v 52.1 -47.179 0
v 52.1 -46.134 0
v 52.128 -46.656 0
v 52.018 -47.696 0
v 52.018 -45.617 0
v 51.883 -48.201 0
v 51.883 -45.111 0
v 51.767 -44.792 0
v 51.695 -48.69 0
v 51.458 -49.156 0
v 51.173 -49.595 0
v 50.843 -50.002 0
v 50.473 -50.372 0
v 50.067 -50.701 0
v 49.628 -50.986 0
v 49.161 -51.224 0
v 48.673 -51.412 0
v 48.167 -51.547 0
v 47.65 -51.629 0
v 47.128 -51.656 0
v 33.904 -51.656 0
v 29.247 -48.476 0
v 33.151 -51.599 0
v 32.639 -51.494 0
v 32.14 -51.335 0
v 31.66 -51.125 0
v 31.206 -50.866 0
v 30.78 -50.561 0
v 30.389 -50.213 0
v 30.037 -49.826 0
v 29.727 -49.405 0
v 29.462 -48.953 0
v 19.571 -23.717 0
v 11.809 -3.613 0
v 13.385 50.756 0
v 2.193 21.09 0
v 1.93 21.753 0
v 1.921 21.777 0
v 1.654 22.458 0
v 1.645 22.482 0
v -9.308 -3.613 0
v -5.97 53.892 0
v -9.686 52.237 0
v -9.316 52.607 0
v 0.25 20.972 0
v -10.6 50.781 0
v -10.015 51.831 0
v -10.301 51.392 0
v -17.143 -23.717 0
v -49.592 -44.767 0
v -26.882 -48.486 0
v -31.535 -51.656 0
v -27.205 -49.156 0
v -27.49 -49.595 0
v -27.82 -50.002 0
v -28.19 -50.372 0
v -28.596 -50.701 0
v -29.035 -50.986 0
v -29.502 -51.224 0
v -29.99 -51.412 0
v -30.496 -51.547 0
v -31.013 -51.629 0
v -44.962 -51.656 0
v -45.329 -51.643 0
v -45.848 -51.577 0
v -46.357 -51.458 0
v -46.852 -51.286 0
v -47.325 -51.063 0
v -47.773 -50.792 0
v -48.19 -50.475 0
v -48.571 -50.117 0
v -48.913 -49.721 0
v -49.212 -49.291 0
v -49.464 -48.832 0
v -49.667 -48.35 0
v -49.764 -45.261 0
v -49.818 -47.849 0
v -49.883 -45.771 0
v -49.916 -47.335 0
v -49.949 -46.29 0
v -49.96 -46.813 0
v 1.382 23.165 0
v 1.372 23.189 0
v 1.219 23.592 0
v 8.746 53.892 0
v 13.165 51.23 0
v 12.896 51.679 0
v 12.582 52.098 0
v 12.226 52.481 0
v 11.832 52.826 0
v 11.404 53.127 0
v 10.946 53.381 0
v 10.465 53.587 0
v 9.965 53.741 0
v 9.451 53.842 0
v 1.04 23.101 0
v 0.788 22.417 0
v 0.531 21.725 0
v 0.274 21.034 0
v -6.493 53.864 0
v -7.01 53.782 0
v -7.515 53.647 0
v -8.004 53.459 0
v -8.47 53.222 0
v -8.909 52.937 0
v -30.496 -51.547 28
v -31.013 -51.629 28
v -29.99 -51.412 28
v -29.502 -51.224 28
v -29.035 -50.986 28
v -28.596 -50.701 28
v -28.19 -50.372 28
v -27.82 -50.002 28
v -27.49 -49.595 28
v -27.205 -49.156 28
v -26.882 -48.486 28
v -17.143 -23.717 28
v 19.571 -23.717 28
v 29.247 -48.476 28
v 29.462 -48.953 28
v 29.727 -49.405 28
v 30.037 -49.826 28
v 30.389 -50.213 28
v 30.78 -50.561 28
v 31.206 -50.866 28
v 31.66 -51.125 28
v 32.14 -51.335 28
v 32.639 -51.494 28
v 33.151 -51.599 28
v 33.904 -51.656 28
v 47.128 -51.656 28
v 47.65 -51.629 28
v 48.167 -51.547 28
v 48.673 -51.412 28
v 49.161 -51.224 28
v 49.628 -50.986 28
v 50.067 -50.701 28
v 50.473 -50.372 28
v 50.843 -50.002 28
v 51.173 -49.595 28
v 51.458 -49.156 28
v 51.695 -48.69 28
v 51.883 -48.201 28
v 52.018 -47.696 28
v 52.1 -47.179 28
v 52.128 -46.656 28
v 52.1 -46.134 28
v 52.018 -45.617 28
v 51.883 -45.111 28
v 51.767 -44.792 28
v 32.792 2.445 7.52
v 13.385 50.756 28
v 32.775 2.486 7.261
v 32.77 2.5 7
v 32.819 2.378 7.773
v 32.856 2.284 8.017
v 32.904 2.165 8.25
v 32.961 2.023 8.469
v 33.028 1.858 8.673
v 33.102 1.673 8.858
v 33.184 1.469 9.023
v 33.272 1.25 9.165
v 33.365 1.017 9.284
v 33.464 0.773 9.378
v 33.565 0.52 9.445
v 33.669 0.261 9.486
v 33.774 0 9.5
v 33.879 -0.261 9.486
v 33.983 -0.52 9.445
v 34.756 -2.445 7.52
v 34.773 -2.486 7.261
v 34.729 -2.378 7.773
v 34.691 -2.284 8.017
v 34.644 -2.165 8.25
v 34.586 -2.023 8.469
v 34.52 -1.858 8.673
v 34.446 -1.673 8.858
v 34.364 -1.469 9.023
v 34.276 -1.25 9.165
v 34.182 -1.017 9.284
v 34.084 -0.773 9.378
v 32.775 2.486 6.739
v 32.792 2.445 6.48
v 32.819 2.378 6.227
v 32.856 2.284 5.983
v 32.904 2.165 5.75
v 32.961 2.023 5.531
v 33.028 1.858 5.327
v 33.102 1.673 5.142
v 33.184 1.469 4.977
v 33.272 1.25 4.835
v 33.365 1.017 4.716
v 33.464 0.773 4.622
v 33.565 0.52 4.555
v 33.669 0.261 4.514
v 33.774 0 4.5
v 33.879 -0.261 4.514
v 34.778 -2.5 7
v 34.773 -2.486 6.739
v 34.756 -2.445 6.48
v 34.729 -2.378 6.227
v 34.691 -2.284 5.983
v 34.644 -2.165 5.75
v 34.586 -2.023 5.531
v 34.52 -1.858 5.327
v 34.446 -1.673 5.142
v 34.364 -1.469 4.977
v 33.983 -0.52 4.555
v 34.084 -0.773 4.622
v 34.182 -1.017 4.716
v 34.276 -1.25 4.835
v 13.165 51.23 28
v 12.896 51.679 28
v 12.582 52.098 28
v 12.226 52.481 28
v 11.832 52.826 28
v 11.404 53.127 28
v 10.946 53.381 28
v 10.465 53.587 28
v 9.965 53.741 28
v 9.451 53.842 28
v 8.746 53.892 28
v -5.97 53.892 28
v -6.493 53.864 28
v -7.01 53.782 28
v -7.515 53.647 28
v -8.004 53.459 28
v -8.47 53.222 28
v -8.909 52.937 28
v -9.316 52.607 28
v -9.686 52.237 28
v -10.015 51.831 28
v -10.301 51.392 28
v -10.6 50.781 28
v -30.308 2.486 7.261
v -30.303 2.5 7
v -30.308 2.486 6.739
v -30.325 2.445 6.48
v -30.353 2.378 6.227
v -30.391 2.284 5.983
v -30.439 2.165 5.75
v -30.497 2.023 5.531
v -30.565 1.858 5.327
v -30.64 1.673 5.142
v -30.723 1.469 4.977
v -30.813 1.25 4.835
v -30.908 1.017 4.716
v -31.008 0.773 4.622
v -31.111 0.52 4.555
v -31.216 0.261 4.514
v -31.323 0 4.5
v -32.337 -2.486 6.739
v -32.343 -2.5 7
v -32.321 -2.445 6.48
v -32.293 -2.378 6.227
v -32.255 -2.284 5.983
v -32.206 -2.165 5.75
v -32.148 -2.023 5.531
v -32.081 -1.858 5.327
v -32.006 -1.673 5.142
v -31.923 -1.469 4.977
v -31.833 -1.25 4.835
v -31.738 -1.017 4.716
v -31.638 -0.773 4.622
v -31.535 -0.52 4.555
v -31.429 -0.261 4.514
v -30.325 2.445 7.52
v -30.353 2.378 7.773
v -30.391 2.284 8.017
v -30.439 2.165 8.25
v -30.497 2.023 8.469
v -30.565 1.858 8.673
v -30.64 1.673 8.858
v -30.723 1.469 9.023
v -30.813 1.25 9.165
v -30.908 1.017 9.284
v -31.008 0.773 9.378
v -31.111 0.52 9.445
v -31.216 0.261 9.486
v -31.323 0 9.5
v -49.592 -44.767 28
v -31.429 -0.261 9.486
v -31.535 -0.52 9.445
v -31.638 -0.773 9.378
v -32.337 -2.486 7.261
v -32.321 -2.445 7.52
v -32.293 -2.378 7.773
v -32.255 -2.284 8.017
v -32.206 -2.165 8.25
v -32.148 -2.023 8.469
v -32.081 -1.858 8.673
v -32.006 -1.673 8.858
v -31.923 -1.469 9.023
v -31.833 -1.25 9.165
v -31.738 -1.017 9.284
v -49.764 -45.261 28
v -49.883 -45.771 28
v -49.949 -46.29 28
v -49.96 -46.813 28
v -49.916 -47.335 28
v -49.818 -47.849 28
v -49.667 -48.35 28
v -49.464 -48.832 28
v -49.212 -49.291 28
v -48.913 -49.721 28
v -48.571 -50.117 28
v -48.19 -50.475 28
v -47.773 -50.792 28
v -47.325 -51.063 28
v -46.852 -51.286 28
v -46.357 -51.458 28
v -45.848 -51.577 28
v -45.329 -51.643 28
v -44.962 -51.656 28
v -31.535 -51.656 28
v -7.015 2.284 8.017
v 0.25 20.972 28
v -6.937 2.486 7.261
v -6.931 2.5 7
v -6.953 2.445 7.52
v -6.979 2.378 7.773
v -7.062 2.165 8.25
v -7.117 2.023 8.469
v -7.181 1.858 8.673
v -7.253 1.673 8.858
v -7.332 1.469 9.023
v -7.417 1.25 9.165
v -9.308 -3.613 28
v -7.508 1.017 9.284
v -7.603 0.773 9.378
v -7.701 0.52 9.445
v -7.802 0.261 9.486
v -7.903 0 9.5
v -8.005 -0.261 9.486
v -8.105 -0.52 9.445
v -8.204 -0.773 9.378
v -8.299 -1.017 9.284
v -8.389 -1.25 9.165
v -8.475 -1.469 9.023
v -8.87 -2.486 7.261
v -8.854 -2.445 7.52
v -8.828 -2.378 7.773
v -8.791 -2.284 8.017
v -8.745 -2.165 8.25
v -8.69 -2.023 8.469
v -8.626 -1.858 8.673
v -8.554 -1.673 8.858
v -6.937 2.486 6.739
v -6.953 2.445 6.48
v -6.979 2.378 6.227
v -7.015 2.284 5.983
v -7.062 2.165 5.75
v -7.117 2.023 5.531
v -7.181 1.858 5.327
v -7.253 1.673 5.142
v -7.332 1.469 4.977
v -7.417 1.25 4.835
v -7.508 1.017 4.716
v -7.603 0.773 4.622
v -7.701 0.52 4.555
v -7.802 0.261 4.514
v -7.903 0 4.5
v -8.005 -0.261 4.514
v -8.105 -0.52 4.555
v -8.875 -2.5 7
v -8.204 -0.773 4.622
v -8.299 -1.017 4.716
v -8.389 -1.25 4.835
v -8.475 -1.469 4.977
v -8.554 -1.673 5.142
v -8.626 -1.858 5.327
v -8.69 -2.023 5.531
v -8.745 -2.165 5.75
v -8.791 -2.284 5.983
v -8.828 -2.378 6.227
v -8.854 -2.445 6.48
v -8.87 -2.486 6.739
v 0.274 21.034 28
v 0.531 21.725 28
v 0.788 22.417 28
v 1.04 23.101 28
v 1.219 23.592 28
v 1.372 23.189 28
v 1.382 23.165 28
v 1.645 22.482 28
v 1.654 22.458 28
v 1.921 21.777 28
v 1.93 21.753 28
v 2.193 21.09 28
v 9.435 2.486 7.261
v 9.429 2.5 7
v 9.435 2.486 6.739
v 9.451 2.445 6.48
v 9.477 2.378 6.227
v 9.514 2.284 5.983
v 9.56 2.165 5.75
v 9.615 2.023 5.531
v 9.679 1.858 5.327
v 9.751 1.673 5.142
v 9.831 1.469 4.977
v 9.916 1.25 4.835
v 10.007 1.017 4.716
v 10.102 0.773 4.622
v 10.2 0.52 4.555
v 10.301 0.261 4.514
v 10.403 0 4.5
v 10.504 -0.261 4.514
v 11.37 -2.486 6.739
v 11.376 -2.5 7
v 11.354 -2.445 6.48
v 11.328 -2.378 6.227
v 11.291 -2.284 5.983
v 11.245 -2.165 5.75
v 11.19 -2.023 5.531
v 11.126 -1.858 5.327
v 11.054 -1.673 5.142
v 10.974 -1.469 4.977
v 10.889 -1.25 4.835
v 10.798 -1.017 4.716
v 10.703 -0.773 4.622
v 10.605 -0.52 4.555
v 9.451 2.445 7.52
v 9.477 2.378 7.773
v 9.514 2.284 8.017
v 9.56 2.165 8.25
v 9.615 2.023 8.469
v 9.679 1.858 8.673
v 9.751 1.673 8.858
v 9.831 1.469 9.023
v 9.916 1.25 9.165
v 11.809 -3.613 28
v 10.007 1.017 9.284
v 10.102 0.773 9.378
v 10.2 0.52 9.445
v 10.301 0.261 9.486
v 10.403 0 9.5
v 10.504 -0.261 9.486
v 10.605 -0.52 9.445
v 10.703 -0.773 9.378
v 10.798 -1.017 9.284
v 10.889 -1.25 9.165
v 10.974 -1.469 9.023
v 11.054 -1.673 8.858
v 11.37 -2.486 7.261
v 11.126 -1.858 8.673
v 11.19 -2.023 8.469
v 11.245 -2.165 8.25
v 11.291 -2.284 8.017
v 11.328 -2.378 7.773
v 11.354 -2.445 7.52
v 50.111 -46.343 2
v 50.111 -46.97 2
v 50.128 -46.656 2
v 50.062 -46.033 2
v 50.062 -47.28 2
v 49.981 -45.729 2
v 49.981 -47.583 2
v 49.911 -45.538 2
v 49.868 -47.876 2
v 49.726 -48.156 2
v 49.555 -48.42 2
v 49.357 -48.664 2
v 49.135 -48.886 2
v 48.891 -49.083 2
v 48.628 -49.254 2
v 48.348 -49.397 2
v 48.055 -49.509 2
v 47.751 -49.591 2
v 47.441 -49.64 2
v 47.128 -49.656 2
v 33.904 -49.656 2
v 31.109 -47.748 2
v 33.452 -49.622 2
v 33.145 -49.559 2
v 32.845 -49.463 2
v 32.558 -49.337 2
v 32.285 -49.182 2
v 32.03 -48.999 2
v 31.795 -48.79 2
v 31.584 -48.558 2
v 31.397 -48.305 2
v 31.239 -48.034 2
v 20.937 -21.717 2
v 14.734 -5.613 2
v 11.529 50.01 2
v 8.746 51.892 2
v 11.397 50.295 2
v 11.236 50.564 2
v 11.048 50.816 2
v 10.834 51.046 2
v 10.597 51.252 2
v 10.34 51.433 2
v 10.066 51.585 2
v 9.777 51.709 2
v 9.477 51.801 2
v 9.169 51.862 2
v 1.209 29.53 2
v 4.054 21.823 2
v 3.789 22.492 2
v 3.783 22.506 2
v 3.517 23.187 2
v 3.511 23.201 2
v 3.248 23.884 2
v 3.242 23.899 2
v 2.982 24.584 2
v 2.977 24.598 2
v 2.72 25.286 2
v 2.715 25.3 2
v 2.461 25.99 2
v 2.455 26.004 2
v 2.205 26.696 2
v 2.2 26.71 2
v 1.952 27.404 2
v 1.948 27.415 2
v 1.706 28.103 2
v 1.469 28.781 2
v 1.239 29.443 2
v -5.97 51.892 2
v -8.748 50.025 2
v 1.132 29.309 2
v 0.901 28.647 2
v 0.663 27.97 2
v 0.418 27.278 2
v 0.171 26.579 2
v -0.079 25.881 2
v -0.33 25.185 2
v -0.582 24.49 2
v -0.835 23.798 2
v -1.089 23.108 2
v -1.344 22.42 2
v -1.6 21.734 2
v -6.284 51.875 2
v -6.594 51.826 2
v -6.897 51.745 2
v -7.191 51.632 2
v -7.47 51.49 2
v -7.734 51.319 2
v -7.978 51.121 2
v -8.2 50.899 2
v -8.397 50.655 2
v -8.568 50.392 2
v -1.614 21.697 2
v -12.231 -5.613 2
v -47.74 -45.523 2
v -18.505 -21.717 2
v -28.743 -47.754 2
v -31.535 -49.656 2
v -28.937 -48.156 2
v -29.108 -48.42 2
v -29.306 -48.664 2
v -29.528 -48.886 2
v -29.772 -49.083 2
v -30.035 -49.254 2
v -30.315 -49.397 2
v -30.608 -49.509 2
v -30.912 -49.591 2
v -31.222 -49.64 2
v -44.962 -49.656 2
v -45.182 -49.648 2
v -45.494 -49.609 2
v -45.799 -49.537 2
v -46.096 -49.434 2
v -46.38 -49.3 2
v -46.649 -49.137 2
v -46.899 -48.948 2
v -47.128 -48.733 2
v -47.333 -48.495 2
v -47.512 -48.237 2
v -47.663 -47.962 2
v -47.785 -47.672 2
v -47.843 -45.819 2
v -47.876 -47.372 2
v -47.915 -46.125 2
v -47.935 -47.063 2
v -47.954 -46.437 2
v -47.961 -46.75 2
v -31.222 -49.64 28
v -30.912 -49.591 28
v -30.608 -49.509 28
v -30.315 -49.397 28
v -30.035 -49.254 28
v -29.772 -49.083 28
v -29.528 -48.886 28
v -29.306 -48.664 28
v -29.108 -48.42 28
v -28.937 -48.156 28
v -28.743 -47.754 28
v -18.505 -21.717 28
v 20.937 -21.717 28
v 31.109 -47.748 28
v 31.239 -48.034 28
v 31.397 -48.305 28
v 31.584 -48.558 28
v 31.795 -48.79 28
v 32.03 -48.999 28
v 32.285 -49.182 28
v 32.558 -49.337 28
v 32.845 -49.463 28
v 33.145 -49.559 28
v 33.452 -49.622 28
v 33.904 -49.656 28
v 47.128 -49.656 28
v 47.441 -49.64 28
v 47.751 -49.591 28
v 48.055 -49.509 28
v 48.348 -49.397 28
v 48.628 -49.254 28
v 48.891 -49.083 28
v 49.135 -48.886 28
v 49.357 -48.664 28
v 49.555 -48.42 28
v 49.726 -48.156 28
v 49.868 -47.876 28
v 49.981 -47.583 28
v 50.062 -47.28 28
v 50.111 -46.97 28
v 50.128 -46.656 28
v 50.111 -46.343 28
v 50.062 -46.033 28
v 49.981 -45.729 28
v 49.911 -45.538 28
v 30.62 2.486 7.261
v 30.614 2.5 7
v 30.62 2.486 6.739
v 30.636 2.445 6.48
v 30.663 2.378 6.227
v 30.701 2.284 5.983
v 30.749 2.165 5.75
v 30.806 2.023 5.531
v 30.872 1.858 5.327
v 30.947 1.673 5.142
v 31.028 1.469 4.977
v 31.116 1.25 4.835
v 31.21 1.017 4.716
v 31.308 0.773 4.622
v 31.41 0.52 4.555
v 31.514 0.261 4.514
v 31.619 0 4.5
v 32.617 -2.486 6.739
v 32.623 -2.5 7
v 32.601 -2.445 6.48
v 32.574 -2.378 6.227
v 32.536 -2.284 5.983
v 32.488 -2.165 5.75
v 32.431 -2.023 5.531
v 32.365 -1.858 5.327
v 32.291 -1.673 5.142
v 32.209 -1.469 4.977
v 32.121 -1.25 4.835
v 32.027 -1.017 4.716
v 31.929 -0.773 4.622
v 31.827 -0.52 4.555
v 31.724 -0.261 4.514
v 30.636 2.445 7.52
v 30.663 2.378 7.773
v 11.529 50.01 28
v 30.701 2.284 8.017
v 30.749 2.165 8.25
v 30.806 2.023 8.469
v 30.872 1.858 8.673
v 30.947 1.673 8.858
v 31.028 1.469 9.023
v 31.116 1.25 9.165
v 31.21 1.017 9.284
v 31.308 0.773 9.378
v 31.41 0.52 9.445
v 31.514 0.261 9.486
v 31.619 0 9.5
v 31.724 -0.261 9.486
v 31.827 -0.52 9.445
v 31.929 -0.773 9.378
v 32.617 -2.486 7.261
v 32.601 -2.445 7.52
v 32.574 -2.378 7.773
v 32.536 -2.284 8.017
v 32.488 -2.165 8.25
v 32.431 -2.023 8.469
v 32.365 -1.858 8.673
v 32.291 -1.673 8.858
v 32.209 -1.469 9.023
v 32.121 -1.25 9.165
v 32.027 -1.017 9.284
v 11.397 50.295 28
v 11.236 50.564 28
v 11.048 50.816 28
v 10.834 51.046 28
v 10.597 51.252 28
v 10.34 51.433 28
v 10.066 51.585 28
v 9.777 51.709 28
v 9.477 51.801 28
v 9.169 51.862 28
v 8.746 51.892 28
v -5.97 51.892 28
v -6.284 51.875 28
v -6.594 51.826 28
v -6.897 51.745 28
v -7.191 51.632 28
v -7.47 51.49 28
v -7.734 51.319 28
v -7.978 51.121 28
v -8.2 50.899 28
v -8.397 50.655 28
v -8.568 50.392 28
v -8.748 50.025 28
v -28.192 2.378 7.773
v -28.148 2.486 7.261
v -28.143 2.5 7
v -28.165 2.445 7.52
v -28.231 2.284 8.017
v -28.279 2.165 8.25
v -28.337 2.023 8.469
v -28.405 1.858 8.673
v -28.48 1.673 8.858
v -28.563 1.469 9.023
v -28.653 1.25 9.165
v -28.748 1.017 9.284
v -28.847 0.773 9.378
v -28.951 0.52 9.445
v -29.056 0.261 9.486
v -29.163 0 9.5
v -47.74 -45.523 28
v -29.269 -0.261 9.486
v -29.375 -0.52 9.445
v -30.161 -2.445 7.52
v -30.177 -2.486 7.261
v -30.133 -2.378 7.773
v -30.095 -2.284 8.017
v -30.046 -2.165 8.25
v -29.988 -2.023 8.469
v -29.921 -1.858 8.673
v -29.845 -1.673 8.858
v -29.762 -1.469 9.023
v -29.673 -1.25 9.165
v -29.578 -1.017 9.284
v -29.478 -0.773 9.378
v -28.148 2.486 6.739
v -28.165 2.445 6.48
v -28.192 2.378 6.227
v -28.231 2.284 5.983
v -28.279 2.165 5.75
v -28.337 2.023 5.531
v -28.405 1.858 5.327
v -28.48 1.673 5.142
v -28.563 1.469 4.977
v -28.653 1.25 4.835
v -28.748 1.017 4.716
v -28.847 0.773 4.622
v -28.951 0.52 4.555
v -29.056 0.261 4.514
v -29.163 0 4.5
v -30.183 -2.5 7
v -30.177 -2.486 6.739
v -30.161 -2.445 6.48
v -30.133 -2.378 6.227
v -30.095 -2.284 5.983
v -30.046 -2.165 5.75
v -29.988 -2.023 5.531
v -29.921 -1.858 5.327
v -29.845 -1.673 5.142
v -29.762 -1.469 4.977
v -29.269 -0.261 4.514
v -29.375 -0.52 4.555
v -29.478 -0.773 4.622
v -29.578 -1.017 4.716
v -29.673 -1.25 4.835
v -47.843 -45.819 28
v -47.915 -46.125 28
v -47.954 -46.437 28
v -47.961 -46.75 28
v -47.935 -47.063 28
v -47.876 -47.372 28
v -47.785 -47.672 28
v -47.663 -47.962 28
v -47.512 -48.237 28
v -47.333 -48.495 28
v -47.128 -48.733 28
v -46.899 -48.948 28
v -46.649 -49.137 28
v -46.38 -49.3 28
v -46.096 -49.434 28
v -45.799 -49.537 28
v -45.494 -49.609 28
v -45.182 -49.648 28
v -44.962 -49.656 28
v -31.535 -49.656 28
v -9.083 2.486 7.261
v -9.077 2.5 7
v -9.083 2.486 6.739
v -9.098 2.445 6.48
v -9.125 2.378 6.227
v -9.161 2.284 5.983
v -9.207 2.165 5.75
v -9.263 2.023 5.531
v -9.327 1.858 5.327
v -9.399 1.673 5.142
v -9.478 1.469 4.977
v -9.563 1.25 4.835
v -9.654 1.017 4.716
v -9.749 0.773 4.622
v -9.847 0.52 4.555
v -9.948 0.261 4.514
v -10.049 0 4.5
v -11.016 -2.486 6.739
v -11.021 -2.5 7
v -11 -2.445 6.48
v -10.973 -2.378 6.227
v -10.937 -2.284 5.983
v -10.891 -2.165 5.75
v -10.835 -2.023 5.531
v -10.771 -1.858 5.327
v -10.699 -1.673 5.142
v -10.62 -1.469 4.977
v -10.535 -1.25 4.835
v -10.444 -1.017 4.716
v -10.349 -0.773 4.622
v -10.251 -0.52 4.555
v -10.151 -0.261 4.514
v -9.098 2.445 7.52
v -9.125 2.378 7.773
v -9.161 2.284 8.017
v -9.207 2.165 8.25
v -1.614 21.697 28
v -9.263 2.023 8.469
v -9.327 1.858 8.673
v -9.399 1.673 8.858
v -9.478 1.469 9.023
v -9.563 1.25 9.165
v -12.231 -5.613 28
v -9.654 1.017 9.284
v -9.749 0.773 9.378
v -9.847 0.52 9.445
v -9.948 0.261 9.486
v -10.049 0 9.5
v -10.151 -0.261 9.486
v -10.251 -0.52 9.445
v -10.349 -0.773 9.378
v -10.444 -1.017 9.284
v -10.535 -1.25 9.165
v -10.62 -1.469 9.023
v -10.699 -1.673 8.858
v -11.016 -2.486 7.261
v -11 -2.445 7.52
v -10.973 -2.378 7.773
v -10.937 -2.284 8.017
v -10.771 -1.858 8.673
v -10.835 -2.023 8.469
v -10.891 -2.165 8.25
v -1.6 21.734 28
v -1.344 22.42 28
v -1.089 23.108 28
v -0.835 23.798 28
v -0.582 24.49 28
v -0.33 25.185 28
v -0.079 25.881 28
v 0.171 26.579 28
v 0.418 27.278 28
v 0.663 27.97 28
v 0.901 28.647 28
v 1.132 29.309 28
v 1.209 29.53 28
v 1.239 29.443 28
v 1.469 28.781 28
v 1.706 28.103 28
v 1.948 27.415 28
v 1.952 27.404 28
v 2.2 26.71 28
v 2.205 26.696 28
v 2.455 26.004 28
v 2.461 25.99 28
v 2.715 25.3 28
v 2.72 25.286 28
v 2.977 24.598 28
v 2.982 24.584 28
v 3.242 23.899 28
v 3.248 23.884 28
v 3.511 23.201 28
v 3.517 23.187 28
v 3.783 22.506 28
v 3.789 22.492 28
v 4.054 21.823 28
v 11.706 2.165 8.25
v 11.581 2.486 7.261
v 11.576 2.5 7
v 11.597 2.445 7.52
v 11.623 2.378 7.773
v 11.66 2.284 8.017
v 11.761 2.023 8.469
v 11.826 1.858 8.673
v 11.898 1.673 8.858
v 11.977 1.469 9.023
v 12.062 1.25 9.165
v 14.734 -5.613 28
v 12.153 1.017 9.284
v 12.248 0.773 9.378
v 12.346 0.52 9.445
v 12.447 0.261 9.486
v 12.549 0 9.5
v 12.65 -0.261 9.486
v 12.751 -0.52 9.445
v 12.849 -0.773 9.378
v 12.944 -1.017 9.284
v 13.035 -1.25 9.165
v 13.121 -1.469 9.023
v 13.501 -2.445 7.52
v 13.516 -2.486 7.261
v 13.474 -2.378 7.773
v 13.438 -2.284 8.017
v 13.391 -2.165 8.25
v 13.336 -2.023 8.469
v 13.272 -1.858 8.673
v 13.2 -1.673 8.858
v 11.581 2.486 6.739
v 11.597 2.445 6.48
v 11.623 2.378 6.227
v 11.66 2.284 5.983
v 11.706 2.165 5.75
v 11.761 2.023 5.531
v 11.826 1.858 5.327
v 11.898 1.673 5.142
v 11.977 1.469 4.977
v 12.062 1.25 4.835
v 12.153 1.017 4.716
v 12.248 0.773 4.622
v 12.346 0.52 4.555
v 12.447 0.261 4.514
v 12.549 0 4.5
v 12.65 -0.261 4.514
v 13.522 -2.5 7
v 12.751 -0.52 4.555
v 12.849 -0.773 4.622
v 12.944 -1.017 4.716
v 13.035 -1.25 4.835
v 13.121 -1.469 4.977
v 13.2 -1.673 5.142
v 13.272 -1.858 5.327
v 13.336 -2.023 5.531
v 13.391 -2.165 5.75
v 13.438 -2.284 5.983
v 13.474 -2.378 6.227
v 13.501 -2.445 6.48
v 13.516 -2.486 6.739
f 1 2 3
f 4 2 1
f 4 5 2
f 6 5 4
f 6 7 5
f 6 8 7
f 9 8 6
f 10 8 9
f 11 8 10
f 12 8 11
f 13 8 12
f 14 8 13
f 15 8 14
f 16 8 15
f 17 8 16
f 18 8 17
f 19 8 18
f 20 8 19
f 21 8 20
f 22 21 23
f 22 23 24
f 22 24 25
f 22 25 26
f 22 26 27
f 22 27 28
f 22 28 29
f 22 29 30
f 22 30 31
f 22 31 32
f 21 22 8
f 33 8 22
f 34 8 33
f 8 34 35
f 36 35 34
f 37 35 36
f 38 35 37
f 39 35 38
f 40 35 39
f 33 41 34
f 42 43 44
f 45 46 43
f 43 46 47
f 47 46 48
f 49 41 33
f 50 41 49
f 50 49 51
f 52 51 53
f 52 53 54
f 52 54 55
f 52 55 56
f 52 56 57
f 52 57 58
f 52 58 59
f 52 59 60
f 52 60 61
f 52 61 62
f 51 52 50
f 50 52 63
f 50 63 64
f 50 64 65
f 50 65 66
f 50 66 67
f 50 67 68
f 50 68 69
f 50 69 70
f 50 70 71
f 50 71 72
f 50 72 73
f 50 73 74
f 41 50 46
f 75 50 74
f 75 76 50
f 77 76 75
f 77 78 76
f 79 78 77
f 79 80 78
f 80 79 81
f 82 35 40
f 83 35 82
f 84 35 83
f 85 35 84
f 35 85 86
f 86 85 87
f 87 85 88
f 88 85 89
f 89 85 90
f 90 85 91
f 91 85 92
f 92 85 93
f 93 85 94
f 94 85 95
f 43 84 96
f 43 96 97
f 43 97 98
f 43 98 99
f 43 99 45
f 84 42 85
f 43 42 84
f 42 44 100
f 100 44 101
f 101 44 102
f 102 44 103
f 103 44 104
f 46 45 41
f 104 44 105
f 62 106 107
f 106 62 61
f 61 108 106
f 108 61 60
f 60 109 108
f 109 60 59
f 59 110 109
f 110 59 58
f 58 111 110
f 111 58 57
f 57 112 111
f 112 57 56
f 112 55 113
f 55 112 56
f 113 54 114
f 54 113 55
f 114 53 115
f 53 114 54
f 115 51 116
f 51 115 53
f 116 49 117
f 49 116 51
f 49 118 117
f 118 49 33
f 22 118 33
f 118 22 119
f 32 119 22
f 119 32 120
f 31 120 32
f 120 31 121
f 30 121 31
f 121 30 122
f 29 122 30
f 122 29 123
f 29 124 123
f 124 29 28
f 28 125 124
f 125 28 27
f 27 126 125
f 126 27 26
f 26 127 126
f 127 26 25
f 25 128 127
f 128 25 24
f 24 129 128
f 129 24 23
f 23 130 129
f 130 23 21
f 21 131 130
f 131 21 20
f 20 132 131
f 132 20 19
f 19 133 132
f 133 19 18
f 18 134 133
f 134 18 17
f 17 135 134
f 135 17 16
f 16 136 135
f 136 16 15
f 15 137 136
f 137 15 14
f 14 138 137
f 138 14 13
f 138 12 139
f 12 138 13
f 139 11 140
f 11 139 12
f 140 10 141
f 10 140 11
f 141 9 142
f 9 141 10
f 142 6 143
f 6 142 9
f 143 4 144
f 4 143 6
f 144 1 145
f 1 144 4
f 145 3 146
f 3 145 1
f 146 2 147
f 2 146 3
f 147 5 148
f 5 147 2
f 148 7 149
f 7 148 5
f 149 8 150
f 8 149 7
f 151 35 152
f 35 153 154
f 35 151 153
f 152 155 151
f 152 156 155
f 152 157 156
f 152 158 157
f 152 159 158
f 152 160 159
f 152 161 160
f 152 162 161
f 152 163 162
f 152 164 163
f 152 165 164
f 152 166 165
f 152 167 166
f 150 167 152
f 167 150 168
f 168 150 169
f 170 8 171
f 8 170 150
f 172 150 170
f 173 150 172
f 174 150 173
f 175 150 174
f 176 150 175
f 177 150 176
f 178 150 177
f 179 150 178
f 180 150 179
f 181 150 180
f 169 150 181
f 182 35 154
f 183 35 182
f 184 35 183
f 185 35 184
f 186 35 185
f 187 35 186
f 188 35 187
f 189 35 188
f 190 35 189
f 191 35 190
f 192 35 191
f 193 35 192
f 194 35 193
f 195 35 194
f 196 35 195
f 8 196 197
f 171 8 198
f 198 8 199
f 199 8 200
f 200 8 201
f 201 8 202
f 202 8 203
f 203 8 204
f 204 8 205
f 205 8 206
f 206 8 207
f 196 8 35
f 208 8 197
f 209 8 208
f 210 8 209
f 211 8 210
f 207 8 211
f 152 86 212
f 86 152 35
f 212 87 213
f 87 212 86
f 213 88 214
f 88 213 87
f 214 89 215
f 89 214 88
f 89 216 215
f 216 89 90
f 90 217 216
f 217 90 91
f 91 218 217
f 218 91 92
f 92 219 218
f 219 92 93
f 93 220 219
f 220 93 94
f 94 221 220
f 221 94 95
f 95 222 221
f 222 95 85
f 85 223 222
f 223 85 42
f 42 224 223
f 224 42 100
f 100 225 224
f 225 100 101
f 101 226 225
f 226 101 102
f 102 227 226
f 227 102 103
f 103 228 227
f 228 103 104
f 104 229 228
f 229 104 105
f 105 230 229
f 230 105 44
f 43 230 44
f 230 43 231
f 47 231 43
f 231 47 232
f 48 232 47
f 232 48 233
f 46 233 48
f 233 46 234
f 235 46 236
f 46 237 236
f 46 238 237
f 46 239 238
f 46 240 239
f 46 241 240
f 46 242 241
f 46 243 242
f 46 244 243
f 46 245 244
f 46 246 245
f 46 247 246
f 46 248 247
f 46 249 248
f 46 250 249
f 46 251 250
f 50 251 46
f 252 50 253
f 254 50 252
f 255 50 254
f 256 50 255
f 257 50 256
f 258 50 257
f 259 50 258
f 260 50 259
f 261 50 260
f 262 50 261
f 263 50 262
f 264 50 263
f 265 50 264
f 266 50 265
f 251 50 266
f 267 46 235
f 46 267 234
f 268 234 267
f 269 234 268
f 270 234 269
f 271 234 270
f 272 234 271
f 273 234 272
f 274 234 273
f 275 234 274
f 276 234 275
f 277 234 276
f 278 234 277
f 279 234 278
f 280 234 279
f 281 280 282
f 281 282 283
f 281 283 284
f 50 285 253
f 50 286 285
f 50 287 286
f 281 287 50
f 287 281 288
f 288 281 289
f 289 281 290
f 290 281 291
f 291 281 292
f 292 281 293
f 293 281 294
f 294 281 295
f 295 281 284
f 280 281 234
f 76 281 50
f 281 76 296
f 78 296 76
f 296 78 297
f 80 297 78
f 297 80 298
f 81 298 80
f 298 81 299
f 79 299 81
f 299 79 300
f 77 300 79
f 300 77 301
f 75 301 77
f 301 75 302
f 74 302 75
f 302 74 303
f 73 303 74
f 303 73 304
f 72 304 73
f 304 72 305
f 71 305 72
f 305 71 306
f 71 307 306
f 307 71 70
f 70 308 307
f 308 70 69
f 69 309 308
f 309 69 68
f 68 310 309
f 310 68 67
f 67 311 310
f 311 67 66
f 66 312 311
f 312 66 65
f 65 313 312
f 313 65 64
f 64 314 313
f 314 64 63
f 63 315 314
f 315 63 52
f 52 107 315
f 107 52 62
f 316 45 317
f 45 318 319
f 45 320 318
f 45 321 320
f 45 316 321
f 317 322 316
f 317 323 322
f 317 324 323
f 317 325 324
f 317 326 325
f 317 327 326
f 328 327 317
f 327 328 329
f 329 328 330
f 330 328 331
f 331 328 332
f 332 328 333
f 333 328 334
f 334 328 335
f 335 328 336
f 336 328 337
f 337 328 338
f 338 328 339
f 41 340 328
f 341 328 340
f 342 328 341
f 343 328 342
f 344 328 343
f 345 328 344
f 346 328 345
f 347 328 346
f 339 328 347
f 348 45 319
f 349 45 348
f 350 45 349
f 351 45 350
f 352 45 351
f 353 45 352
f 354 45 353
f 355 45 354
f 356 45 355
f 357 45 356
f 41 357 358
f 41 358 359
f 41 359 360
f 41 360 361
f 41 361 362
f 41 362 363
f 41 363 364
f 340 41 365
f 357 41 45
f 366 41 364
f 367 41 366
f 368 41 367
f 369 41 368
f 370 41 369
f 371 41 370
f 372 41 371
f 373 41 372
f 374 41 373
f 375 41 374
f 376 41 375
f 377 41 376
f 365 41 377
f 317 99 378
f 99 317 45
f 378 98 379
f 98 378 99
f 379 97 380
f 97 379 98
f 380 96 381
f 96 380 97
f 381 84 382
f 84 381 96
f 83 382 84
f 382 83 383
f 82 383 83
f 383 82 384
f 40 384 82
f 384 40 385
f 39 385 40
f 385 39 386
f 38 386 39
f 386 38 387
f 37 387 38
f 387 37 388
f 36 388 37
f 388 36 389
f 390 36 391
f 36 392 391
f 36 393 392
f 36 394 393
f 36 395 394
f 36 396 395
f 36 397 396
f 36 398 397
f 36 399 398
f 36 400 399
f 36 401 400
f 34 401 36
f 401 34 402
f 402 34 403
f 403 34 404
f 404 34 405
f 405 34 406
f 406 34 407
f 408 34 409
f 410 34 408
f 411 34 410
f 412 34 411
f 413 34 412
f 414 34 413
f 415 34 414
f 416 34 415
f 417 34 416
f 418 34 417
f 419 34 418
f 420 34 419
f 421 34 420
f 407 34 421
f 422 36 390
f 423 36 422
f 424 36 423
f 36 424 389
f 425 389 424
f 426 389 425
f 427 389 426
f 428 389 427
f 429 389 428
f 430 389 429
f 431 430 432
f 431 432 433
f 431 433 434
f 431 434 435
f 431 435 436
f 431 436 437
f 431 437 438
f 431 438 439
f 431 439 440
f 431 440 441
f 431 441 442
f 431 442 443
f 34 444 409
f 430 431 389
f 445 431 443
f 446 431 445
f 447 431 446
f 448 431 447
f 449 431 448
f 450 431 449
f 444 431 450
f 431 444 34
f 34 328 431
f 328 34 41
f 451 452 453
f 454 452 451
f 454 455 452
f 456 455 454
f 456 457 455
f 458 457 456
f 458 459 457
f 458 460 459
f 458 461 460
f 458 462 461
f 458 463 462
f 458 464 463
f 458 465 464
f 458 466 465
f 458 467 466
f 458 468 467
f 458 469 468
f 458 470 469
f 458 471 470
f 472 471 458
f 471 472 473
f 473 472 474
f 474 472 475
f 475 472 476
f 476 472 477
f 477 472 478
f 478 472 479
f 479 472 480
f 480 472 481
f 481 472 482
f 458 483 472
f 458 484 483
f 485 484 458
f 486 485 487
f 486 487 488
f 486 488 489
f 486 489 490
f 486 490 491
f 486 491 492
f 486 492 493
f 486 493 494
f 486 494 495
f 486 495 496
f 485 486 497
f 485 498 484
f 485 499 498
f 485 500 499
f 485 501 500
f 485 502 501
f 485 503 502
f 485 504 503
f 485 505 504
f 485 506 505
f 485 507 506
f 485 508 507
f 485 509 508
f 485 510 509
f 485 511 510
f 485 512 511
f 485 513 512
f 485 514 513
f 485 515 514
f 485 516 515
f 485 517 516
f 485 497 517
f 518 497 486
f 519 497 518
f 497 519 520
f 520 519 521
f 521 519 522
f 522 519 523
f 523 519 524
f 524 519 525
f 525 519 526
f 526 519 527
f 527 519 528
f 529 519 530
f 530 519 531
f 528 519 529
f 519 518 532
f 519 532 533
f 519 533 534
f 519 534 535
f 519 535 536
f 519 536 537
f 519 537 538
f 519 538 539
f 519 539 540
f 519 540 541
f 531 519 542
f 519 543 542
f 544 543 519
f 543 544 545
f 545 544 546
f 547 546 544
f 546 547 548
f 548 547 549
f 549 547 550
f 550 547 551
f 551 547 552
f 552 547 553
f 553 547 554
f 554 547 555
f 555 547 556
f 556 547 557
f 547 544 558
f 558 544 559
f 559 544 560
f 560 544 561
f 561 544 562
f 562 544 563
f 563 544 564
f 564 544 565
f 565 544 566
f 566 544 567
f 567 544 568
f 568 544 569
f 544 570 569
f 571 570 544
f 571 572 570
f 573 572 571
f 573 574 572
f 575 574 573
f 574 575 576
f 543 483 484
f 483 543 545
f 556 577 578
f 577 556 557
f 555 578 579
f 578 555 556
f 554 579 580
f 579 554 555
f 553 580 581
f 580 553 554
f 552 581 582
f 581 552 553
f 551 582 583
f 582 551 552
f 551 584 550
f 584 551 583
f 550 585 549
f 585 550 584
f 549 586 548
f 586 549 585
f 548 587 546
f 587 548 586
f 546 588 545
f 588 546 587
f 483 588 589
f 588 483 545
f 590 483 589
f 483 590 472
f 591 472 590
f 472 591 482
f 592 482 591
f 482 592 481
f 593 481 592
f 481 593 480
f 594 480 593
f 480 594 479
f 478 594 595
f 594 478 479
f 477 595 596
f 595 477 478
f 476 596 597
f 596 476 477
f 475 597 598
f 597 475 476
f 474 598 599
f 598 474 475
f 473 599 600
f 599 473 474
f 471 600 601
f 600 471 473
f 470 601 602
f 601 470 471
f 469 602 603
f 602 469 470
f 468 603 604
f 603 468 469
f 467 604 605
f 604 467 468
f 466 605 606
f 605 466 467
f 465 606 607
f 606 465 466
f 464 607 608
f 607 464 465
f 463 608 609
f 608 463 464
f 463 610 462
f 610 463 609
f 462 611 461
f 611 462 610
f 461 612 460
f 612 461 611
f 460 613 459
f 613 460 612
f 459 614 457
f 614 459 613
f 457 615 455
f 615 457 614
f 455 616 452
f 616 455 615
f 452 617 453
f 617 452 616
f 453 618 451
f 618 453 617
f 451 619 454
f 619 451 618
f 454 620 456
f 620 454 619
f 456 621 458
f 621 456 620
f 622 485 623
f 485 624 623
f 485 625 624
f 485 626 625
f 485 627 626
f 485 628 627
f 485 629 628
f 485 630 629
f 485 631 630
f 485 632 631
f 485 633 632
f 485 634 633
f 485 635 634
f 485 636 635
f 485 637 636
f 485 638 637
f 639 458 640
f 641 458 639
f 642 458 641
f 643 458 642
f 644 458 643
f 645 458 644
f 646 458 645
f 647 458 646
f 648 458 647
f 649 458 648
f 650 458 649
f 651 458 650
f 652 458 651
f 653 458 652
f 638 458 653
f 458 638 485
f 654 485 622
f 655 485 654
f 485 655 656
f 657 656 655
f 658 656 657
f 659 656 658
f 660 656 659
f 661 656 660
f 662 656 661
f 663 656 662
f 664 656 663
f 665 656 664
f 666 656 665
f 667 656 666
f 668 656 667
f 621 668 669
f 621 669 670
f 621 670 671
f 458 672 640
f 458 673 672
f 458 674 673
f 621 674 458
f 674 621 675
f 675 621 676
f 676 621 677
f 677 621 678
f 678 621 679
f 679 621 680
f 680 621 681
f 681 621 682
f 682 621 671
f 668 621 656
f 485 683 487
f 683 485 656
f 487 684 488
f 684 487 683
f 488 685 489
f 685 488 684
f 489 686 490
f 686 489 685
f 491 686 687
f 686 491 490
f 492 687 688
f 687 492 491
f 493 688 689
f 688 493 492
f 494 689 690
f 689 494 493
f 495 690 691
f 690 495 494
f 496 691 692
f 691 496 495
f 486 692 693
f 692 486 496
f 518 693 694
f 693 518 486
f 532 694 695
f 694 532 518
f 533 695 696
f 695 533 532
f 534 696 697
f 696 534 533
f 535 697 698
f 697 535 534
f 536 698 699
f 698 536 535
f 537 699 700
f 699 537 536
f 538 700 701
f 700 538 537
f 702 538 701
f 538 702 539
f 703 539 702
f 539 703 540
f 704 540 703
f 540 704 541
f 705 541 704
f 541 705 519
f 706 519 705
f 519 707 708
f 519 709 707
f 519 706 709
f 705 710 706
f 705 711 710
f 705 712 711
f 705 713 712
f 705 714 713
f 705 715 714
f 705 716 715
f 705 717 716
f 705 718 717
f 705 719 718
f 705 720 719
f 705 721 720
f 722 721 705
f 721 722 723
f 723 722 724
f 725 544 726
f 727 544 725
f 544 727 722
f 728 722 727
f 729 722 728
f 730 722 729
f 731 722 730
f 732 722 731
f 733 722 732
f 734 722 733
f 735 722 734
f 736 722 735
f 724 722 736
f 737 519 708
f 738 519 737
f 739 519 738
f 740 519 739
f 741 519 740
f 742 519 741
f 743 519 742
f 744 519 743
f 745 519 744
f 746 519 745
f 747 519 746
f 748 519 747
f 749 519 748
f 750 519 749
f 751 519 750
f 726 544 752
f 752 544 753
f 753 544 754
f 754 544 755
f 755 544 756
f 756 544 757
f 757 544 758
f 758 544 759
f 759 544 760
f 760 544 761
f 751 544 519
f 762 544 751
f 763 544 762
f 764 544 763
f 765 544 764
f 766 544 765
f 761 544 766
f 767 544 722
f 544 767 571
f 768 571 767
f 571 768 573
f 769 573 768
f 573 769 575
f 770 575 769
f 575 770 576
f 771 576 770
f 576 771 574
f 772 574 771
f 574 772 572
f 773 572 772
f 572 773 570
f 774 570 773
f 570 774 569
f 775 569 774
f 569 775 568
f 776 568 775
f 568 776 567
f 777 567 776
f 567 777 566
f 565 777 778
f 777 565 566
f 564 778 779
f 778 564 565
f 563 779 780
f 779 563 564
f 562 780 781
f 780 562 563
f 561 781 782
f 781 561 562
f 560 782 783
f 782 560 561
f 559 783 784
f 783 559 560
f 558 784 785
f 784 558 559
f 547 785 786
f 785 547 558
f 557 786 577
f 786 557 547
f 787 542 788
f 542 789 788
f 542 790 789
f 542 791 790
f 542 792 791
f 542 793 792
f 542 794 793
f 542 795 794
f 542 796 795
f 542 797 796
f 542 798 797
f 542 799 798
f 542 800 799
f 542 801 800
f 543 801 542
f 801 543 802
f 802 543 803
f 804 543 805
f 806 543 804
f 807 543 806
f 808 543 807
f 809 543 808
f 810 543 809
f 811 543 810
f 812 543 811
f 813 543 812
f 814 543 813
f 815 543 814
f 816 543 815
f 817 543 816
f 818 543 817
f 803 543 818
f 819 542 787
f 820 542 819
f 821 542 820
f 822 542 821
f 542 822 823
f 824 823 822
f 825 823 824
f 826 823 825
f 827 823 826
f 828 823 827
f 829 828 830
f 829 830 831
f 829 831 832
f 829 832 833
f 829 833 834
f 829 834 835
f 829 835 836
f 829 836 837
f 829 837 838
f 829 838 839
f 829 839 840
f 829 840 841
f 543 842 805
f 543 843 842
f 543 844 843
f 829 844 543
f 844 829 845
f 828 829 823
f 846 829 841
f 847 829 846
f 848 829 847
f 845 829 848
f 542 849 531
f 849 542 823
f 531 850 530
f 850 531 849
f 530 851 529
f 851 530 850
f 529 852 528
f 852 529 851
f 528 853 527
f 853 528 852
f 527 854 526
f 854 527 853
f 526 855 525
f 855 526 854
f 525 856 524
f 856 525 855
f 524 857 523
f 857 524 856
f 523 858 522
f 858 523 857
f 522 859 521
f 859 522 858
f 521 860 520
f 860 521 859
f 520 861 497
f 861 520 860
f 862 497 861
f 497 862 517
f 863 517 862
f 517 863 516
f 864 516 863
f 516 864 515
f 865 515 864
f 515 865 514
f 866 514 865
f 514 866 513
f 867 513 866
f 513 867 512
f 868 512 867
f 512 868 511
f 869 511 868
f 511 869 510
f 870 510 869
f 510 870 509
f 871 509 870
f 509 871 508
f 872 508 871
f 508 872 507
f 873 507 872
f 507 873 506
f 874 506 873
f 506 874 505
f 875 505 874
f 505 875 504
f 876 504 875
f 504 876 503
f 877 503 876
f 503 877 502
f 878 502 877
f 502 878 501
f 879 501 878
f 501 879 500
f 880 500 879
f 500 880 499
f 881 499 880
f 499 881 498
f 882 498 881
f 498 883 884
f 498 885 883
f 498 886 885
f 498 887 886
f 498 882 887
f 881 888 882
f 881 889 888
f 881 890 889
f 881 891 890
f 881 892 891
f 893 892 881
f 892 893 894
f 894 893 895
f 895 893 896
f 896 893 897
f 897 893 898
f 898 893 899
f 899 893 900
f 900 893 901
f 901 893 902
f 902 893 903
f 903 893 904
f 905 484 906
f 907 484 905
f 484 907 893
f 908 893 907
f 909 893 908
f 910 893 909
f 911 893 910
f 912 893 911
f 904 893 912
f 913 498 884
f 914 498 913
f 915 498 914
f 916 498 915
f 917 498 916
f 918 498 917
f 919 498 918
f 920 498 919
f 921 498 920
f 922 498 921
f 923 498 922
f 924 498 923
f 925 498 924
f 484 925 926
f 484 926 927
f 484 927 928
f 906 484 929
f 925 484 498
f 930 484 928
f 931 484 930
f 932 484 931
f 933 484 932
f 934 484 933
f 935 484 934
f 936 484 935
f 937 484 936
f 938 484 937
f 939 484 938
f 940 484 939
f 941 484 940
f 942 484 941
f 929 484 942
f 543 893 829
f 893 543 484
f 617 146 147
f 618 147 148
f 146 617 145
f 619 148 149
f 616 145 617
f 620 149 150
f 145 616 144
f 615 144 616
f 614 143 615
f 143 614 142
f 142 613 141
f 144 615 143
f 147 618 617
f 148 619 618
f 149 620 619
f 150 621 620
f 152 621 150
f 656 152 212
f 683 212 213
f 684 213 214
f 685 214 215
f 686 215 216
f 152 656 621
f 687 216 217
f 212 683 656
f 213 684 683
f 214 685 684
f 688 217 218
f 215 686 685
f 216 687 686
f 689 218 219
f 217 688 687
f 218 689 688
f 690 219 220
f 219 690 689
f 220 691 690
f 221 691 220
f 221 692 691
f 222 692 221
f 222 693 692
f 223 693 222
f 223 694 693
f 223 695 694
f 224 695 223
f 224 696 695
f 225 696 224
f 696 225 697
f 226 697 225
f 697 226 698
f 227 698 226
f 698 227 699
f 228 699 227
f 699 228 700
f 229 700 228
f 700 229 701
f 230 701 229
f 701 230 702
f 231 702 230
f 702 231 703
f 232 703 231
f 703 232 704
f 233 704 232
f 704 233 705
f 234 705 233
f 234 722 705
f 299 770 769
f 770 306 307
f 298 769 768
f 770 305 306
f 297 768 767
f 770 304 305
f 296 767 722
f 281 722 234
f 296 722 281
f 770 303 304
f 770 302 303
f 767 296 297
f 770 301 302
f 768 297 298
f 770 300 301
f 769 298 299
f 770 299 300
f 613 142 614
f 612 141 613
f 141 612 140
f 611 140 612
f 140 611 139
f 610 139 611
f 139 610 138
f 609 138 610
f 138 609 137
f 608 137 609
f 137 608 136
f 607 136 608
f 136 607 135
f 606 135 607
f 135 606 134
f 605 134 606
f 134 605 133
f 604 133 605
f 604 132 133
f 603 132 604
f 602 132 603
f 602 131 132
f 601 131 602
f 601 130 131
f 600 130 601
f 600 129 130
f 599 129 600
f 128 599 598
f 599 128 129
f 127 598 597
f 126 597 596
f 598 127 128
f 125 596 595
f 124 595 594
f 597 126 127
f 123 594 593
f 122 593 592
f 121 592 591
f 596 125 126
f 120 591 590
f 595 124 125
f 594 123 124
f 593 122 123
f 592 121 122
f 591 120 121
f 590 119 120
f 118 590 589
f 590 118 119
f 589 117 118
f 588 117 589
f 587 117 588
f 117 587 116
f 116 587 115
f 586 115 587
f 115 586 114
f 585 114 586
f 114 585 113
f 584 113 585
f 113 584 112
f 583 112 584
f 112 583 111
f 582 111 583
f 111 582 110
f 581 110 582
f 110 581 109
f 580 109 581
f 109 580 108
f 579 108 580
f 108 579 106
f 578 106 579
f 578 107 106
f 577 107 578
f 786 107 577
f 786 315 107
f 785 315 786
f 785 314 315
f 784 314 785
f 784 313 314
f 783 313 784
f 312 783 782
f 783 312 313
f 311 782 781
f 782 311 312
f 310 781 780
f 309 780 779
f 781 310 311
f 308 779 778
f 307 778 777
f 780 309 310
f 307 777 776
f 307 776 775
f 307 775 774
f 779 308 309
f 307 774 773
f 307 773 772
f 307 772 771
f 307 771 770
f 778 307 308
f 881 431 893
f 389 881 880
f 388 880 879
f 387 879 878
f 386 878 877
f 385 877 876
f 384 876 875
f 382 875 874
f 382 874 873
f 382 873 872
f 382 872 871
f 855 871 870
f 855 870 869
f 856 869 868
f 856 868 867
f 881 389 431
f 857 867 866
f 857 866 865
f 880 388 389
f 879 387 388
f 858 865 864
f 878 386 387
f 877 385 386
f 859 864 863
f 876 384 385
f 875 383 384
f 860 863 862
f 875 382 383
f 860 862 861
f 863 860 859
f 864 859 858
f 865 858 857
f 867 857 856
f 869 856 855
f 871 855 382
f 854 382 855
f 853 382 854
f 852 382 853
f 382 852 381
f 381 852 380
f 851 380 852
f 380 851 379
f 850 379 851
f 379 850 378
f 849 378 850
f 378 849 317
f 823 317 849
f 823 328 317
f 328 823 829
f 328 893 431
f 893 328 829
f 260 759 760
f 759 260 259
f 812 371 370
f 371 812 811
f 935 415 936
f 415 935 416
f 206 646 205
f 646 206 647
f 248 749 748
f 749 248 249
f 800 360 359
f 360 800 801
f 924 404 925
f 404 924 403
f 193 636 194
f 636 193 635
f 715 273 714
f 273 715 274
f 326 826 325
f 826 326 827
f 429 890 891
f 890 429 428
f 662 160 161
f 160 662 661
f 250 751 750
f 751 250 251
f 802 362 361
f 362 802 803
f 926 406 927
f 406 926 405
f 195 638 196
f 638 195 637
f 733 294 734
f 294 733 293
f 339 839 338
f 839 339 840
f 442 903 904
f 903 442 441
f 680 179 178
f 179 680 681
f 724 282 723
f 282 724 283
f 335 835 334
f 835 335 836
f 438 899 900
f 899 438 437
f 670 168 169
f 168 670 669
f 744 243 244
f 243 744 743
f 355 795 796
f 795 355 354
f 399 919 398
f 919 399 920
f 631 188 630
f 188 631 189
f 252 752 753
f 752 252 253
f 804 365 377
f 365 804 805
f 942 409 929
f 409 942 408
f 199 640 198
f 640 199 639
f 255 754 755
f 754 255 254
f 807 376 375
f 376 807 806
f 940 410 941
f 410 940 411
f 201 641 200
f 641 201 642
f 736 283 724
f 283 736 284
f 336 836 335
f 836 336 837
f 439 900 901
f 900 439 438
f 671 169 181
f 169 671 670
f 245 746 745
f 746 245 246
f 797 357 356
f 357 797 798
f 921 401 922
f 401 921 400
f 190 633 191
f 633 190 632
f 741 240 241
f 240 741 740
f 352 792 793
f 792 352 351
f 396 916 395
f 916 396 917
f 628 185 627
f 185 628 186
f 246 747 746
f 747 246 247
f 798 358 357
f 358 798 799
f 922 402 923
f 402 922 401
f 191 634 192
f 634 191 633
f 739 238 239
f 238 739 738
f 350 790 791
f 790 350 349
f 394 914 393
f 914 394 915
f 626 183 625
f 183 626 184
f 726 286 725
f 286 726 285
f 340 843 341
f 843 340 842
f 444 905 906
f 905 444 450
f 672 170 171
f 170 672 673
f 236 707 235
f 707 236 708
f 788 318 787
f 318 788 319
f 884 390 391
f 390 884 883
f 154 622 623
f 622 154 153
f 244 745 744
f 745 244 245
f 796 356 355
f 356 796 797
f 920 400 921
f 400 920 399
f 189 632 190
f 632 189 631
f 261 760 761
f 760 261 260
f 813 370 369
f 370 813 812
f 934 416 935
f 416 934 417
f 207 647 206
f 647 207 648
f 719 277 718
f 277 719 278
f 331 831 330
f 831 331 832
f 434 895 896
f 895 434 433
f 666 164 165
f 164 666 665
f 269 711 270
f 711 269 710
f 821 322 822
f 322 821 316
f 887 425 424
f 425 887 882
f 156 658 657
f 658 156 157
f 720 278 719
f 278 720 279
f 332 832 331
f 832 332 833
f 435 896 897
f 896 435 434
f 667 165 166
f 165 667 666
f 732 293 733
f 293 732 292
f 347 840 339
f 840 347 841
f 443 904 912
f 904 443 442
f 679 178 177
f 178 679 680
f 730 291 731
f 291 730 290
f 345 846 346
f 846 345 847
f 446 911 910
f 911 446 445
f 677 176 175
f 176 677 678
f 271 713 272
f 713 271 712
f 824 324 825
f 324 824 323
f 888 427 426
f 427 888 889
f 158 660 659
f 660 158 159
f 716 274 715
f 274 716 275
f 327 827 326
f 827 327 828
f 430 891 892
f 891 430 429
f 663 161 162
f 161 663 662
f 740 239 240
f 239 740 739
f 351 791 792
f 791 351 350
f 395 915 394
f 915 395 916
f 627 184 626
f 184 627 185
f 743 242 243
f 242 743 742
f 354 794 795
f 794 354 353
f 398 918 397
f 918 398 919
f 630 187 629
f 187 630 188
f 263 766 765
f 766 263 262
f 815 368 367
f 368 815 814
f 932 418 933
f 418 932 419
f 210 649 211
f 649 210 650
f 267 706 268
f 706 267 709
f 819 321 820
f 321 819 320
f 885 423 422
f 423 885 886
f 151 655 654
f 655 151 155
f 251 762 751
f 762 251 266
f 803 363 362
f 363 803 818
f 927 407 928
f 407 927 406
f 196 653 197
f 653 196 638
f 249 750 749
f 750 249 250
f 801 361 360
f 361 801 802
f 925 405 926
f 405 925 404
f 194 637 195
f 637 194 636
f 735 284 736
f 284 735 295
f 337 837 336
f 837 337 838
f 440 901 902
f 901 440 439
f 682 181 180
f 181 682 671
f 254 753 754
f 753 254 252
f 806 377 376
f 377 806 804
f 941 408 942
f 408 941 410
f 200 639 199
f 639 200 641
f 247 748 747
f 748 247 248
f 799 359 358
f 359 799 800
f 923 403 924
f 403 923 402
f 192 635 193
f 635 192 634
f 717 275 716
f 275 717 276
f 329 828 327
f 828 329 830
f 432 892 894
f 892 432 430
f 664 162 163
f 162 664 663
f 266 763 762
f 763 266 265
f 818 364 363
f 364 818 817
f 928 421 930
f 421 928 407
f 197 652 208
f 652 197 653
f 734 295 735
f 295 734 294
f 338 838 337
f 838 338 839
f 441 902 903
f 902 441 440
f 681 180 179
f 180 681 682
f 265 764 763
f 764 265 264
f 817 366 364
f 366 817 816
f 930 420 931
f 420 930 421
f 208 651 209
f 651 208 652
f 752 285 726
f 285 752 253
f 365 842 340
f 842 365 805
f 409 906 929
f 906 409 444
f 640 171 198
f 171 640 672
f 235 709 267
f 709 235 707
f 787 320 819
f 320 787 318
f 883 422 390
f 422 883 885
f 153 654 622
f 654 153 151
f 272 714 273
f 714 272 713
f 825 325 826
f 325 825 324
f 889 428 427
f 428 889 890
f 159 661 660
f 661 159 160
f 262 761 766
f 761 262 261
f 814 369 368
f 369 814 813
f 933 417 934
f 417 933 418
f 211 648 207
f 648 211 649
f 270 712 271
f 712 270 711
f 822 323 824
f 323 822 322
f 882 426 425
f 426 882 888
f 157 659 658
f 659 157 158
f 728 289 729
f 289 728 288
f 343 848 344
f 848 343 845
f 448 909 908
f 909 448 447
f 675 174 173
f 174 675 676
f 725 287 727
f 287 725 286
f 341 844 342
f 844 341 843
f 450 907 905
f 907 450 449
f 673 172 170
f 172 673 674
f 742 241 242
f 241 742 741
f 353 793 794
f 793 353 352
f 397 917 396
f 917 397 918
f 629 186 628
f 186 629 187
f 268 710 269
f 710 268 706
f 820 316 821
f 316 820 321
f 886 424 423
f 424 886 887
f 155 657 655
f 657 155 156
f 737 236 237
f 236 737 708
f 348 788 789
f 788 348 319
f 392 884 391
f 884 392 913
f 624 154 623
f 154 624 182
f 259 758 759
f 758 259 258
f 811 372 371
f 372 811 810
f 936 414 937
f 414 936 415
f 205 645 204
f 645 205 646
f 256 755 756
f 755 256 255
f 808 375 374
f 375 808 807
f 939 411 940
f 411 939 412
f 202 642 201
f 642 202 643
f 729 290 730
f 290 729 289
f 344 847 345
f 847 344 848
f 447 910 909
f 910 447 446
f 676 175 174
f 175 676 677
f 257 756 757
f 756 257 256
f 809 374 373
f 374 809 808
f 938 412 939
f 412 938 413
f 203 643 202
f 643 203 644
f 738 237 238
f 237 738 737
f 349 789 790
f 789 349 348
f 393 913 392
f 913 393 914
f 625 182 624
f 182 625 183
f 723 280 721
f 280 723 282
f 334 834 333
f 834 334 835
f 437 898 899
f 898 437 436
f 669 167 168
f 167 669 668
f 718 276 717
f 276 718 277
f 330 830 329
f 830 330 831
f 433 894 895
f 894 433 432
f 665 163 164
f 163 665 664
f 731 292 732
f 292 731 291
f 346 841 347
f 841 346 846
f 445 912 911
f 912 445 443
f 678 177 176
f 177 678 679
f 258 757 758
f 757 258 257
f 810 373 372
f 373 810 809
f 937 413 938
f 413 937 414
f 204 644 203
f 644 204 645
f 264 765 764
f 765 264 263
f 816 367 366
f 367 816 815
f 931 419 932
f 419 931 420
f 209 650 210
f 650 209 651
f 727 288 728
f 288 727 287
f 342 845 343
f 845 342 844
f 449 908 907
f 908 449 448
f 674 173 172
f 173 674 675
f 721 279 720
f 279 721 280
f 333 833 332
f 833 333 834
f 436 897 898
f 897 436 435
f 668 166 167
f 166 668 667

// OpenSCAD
// AUTOMATICALLY GENERATED FILE: Letter_A
// SIGN SCULPTOR ENGINE V2

Render_Mode = "Body"; // Set to "Lid" to export the cover
Letter = "A";
Font_Size = 100;
Font_Name = "Arial:style=Black";
Light_Type = "Silicone_Neon_6mm";

// -- Engineering Constants --
Sign_Height = 30.0;
Wall_Thickness = 2.0;
Base_Thickness = 2.0;
Lid_Tolerance = 0.15;
Hole_Height = 5.0;
Hole_Size = 5.0;

// -- Logic Engine --
CW = (Light_Type == "Silicone_Neon_6mm") ? 6.0 :
     (Light_Type == "Silicone_Neon_8mm") ? 8.0 :
     (Light_Type == "LED_Strip_10mm")    ? 10.5 :
     (Light_Type == "Individual_Pixels")  ? 14.0 : 6.0;

Lip_Overhang = (Light_Type == "Silicone_Neon_6mm" || Light_Type == "Silicone_Neon_8mm") ? 0.4 : 0.0;

$fn = 60;

module letter_shape() {
    text(text=Letter, size=Font_Size, font=Font_Name, halign="center", valign="center");
}

module body_geometry() {
    difference() {
        // 1. Positive Block
        linear_extrude(Sign_Height)
            offset(r = CW/2 + Wall_Thickness)
            letter_shape();

        // 2. Light Channel
        translate([0,0, Base_Thickness])
            linear_extrude(Sign_Height + 1)
            offset(r = CW/2)
            letter_shape();

        // 3. Friction Lip
        if (Lip_Overhang > 0) {
            translate([0,0, Sign_Height - 2.0])
                linear_extrude(3.0)
                difference() {
                    offset(r = CW/2 + 5) letter_shape();
                    offset(r = CW/2 - Lip_Overhang) letter_shape();
                }
        }
        
        // 4. Lid Shelf
        translate([0,0, Sign_Height - 2.0])
            linear_extrude(3.0)
            offset(r = CW/2 + 1.5)
            letter_shape();

        // 5. WIRE CHANNELS (Dynamic Side Holes)
        // Left Hole
        translate([-Font_Size/1.8, 0, Hole_Height + Base_Thickness])
            rotate([0, 90, 0])
            cylinder(h = Font_Size, r = Hole_Size/2);
            
        // Right Hole
        translate([Font_Size/1.8, 0, Hole_Height + Base_Thickness])
            rotate([0, -90, 0])
            cylinder(h = Font_Size, r = Hole_Size/2);
    }
}

module lid_geometry() {
    color("White")
        linear_extrude(2.0)
        offset(r = (CW/2 + 1.5) - Lid_Tolerance)
        letter_shape();
}

// Render Controller
if (Render_Mode == "Body") {
    body_geometry();
} else if (Render_Mode == "Lid") {
    lid_geometry();
}
